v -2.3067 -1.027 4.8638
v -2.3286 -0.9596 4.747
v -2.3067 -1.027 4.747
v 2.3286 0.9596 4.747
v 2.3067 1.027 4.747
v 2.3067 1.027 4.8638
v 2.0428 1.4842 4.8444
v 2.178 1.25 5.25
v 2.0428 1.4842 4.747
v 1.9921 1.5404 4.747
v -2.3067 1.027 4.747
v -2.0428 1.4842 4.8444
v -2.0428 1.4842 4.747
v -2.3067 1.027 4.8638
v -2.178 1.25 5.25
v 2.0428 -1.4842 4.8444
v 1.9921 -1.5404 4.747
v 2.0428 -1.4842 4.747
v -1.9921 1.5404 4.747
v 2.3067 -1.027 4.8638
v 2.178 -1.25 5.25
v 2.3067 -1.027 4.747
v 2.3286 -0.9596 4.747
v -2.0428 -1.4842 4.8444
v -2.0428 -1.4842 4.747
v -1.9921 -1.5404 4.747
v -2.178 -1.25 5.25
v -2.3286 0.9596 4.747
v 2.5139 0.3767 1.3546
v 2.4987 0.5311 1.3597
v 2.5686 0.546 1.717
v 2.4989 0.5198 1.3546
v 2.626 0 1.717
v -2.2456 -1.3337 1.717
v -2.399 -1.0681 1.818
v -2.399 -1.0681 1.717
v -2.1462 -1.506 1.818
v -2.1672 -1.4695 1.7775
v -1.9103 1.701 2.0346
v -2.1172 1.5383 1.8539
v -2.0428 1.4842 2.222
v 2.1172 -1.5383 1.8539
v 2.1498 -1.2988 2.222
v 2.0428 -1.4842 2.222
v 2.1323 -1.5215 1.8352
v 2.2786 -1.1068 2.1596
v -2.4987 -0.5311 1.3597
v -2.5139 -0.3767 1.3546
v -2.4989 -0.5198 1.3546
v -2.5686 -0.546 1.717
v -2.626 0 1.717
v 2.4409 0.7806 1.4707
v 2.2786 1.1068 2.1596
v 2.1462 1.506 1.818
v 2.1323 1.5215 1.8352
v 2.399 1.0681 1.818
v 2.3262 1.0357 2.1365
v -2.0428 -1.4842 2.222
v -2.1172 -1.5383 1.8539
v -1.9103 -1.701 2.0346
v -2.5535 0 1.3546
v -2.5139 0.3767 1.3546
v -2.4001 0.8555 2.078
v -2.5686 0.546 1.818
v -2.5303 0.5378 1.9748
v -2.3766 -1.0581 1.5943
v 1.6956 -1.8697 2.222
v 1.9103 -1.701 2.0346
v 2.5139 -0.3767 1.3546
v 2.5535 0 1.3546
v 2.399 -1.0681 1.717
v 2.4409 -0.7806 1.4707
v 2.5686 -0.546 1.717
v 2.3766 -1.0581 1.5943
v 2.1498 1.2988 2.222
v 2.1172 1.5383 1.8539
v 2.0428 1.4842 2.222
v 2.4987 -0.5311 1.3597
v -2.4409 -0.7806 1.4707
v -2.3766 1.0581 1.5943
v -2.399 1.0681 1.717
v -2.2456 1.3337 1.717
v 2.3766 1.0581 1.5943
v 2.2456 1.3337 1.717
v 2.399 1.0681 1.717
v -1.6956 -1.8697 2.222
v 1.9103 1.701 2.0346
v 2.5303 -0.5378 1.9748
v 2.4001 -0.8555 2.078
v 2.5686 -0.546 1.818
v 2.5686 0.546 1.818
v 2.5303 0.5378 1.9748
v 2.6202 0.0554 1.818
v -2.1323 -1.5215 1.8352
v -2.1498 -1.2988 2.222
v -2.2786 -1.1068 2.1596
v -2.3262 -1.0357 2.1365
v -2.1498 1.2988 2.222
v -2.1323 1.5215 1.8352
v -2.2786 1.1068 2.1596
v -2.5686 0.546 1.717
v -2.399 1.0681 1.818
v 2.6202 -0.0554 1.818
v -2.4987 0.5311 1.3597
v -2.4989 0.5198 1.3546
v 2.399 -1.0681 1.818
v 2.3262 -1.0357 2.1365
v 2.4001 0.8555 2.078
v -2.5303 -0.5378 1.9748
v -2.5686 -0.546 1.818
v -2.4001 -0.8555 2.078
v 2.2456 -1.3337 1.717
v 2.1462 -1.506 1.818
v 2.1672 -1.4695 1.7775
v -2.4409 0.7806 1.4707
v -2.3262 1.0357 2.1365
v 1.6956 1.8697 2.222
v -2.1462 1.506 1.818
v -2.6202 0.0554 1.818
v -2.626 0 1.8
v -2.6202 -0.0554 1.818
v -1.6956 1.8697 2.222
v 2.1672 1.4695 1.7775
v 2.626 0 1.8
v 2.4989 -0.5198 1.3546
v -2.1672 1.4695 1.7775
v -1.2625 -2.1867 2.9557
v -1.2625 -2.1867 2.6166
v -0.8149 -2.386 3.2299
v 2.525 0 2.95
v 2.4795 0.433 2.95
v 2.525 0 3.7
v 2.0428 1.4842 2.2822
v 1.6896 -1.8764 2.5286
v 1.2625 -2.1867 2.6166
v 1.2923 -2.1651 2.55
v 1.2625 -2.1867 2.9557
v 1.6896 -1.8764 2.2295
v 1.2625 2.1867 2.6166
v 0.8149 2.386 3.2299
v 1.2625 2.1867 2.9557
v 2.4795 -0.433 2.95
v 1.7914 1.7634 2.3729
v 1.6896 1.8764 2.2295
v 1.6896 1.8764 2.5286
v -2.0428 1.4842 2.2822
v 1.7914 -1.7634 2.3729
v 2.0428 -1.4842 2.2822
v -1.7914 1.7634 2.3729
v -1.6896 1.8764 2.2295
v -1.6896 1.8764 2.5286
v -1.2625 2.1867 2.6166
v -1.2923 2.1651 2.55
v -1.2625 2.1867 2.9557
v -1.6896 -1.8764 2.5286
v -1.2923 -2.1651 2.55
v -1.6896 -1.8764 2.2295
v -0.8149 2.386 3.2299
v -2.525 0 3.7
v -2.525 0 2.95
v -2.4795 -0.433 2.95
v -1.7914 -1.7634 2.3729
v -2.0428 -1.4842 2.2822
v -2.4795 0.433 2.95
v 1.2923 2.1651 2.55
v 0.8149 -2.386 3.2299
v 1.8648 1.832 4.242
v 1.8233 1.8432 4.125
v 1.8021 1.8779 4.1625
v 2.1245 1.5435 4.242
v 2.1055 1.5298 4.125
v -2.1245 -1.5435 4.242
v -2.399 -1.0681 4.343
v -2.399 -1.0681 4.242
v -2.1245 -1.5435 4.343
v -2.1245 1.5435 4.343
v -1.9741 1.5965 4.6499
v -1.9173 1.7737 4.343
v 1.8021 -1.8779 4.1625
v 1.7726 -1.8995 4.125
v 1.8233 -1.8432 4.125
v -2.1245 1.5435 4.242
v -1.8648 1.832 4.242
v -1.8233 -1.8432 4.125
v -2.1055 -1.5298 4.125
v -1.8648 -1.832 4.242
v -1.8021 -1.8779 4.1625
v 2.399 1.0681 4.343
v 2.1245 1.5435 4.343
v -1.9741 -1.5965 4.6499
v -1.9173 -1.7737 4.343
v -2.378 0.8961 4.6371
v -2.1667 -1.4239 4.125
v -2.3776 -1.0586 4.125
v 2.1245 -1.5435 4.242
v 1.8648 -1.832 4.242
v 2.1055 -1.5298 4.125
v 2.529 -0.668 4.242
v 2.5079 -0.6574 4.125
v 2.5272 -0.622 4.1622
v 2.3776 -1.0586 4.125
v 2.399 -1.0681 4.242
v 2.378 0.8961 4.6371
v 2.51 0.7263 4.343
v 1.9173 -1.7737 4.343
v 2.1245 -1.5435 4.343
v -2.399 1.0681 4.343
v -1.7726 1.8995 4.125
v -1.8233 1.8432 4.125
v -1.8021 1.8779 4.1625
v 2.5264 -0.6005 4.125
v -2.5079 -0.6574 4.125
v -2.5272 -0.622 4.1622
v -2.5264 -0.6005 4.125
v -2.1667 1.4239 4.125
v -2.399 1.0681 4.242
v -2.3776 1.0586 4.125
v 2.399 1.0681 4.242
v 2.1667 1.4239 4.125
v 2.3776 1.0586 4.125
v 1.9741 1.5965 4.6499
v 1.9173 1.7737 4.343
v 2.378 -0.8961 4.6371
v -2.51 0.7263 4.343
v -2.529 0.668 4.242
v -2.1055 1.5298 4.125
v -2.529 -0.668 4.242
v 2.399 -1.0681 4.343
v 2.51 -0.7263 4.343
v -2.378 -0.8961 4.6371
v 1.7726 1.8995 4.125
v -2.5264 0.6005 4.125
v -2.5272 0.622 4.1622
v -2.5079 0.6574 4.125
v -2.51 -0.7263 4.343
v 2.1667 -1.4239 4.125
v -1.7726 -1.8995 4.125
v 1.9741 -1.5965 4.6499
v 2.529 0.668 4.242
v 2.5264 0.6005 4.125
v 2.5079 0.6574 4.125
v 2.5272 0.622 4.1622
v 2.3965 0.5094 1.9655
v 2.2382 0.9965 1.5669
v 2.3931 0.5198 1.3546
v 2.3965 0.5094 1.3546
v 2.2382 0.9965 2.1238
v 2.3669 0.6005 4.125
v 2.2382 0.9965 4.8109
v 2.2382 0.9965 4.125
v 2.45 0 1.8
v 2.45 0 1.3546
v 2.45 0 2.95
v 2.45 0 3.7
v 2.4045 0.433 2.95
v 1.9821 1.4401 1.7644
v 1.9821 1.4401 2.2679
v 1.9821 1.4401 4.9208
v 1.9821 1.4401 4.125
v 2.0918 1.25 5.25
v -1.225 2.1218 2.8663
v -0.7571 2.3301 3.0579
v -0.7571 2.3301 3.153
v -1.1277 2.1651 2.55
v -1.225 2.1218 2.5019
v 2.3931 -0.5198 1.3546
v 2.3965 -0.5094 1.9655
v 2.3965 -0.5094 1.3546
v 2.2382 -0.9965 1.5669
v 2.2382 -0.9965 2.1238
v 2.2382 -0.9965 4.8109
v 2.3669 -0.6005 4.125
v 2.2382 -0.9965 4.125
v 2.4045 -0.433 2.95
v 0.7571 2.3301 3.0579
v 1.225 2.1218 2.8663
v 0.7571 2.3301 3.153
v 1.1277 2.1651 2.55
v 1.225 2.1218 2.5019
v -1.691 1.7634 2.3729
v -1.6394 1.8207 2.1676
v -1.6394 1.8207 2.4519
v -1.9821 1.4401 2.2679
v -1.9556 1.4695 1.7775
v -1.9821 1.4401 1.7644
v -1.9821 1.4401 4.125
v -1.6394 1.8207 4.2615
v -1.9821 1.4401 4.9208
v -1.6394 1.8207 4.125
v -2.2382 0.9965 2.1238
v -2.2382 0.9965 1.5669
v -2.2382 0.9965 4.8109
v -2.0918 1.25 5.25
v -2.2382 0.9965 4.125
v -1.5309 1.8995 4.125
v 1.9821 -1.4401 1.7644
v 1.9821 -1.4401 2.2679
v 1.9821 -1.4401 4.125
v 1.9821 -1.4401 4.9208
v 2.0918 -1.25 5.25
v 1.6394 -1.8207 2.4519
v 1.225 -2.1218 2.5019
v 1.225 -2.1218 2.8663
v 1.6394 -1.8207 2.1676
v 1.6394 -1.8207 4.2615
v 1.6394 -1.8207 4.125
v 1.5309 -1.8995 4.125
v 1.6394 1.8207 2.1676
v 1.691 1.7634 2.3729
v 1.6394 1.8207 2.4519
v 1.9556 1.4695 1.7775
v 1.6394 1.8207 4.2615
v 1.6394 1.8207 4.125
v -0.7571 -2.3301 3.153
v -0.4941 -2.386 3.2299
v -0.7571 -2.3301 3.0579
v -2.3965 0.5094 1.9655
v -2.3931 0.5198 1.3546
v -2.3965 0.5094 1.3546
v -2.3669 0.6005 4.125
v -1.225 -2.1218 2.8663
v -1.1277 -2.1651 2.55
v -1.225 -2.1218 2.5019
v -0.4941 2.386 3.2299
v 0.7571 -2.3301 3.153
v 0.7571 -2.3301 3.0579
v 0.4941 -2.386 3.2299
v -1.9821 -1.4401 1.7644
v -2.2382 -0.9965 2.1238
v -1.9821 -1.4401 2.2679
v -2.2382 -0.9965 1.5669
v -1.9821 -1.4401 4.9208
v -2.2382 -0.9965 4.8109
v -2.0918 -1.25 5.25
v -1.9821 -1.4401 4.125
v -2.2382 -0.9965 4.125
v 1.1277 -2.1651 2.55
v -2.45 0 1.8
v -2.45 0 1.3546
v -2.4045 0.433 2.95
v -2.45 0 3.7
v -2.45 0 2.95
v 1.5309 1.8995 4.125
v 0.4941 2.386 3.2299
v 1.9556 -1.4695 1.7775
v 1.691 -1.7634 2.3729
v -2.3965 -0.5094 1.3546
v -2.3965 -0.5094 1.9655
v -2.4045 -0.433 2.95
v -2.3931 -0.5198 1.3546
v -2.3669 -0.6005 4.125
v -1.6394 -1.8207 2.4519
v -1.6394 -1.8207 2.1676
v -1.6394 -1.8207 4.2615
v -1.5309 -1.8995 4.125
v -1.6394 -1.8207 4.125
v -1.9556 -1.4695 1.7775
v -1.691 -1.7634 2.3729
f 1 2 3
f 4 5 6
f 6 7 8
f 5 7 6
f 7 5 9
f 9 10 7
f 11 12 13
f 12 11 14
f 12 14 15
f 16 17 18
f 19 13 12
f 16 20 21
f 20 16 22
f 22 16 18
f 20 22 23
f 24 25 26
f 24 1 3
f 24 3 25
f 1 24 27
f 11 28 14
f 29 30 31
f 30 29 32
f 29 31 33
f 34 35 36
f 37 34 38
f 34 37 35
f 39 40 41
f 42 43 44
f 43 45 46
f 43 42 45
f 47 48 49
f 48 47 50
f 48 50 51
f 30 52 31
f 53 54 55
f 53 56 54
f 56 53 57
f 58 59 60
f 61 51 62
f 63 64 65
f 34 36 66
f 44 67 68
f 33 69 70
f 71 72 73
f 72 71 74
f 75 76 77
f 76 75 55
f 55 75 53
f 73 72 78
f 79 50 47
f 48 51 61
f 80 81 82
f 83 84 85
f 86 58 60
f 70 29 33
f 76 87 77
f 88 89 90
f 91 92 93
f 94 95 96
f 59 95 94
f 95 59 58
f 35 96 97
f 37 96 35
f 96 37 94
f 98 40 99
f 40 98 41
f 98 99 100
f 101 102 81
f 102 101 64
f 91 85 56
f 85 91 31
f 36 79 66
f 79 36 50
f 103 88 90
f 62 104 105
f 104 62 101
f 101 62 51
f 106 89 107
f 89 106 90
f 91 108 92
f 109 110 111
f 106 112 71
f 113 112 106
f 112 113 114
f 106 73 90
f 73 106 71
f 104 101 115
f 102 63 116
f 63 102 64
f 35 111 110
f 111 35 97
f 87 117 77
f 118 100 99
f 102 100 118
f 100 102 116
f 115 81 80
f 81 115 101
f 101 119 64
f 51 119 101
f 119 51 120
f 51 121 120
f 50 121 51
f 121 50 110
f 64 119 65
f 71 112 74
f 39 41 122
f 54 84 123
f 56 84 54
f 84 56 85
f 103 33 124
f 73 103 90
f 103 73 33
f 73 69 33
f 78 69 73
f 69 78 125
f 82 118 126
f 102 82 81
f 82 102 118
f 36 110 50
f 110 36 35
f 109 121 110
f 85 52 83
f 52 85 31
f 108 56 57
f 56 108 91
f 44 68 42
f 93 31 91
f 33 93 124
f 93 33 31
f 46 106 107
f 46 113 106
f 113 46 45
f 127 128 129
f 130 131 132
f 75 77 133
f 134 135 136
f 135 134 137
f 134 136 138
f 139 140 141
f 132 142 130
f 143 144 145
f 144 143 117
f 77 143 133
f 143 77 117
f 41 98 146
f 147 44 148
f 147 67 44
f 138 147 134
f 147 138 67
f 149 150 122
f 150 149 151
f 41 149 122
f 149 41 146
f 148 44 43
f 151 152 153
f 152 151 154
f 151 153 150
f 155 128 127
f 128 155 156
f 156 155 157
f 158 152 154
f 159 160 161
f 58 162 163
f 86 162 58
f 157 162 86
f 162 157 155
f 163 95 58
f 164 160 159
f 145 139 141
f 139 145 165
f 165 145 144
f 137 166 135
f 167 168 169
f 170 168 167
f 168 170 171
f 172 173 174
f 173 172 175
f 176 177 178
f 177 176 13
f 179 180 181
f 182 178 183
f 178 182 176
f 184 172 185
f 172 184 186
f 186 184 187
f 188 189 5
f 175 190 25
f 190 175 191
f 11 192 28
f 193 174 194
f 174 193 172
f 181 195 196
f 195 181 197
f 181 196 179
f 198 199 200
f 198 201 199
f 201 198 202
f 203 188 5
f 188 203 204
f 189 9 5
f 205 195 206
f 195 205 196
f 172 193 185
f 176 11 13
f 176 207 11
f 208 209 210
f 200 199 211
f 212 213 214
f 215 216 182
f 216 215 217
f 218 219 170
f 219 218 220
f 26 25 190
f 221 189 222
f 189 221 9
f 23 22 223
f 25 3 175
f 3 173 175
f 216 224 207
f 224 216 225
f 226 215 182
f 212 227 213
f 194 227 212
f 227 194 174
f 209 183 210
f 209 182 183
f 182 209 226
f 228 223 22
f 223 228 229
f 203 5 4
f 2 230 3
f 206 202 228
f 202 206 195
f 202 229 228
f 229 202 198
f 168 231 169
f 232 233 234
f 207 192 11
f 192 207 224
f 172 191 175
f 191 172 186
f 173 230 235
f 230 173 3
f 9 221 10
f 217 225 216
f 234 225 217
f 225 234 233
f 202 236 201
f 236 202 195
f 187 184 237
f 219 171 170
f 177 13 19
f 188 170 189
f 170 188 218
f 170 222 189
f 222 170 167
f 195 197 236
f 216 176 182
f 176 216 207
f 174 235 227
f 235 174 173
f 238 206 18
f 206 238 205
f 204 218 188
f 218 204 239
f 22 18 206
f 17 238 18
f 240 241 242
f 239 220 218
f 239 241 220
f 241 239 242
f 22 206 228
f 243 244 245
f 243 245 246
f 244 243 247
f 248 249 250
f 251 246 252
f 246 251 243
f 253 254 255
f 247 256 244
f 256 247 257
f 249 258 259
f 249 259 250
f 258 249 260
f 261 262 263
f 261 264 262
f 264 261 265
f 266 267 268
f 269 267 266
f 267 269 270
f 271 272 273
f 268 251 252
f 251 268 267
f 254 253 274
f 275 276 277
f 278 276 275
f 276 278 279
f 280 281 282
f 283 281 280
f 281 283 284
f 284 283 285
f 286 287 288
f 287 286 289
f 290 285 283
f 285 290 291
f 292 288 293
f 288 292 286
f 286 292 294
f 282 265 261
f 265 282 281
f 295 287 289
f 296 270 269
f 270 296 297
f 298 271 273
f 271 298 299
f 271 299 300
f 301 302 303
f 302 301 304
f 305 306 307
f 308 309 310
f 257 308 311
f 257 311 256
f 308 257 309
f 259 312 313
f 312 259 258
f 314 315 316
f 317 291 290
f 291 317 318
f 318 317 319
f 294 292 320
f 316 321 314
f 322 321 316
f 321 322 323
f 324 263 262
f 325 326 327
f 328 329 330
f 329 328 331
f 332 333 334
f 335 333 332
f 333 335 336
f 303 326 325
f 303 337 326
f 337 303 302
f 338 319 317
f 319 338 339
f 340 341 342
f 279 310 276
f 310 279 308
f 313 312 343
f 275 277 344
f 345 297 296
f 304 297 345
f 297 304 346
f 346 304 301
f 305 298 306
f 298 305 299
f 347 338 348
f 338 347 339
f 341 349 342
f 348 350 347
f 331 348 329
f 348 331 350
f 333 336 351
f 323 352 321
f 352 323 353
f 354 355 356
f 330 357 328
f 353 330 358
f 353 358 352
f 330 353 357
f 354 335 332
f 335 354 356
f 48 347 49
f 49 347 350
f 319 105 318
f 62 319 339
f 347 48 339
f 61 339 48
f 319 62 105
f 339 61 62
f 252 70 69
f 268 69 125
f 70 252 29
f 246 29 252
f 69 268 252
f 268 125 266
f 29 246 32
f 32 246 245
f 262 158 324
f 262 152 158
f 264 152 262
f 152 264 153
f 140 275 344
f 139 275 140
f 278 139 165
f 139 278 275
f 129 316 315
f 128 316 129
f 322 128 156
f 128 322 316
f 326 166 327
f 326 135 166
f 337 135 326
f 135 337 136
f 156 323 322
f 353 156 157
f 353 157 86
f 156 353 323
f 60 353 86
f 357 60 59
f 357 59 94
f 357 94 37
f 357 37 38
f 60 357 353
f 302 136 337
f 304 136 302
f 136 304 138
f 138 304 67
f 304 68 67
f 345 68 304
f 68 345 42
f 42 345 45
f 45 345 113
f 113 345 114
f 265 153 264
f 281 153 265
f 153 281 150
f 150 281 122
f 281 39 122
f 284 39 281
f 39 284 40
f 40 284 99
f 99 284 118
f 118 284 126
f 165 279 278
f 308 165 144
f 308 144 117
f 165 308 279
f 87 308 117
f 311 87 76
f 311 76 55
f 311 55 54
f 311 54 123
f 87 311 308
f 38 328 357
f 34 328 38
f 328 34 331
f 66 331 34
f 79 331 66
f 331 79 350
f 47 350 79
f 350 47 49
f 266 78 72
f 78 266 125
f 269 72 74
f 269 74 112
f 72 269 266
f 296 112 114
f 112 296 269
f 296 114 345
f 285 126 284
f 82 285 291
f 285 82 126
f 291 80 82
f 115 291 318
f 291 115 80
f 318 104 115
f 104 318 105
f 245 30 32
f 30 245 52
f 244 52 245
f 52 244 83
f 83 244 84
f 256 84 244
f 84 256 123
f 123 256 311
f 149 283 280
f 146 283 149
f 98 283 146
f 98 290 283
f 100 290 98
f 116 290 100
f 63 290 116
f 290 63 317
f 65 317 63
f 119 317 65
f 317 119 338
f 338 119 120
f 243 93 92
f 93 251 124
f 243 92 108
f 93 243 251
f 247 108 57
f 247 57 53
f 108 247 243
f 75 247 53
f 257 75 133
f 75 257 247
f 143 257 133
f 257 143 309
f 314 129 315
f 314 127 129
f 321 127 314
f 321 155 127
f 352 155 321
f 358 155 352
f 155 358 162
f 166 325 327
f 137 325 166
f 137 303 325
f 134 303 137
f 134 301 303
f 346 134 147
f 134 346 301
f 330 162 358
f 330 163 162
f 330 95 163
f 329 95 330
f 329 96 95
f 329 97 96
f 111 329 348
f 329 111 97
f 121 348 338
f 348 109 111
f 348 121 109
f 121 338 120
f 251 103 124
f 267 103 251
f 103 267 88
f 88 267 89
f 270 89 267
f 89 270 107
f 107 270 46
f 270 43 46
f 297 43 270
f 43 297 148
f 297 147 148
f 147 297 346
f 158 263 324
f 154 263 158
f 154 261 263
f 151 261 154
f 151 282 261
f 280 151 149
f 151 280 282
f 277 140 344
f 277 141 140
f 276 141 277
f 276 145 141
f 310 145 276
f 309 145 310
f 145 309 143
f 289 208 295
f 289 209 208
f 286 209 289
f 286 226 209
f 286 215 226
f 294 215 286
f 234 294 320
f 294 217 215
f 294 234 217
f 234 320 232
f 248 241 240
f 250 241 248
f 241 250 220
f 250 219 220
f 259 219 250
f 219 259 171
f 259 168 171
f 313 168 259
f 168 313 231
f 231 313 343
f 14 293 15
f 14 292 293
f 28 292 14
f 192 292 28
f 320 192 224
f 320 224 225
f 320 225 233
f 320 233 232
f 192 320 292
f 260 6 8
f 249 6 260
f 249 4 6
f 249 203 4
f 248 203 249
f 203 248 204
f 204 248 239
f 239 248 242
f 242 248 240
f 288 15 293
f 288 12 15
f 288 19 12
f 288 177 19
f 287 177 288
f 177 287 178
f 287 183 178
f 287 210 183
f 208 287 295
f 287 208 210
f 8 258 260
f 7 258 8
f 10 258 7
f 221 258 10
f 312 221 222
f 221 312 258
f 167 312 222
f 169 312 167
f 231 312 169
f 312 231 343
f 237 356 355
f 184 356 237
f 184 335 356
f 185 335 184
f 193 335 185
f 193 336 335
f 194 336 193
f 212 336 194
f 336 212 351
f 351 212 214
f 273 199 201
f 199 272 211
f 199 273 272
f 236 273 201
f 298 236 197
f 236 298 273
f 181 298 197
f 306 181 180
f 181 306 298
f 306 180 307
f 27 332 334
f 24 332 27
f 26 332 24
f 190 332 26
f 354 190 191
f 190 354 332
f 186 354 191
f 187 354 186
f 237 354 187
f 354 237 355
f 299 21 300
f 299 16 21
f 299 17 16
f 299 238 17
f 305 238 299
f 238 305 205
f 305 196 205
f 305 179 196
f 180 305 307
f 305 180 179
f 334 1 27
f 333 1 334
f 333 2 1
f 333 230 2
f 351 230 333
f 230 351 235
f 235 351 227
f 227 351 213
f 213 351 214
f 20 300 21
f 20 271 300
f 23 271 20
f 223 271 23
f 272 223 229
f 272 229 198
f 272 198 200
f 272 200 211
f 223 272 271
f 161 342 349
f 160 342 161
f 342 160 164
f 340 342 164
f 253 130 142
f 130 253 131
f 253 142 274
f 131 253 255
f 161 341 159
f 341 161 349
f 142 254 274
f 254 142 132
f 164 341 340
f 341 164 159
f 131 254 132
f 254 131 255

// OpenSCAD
// file: keg-shape.scad
module keg() {
    cylinder(r1=24, r2=25, h=12);

    translate([0, 0, 12])
    hull() {
        cylinder(r=25, h=10);
        translate([0, 0, 5])
        cylinder(r=26, h=1);
    }

    translate([0, 0, 22])
    cylinder(r=25, h=15);

    translate([0, 0, 37])
    hull() {
        cylinder(r=25, h=10);
        translate([0, 0, 5])
        cylinder(r=26, h=1);
    }

    translate([0, 0, 45])
    difference() {
        cylinder(r=25, h=15);

        translate([0, 0, 5.01])
        cylinder(r=23, h=10);

        translate([-7.5, -50, 7])
        cube([15, 100, 5]);
    }

    cylinder(d=10, h=55);

}
// main file
use <./keg-shape.scad>
scale = 0.1;
scale([scale, scale, scale])
union() {
intersection() {
	difference() {
		scale([1.01, 1.01, 1.01]) keg();
		cylinder(d=49, h=100);
	}
	theFace();
}
}


module theFace() {
	rotate(90)
	translate([10, 30, 45])
	rotate(90)
	rotate([0, -90, 0])
	union() {
		// left eye
		translate([0, -2.5, 0])
		cylinder(d=15, h=60, $fn=3);

		// right eye
		translate([0, 22.5, 0])
		cylinder(d=15, h=60, $fn=3);

		// nose
		translate([-13, 10, 0])
		cylinder(d=10, h=60, $fn=3);

		//mouth
		translate([-7, 10, 0])
		difference() {
			cylinder(d=50, h=60, $fn=15);
			translate([10, 0, -0.1])
			cylinder(d=60, h=61, $fn=10);
		}
	}
}
